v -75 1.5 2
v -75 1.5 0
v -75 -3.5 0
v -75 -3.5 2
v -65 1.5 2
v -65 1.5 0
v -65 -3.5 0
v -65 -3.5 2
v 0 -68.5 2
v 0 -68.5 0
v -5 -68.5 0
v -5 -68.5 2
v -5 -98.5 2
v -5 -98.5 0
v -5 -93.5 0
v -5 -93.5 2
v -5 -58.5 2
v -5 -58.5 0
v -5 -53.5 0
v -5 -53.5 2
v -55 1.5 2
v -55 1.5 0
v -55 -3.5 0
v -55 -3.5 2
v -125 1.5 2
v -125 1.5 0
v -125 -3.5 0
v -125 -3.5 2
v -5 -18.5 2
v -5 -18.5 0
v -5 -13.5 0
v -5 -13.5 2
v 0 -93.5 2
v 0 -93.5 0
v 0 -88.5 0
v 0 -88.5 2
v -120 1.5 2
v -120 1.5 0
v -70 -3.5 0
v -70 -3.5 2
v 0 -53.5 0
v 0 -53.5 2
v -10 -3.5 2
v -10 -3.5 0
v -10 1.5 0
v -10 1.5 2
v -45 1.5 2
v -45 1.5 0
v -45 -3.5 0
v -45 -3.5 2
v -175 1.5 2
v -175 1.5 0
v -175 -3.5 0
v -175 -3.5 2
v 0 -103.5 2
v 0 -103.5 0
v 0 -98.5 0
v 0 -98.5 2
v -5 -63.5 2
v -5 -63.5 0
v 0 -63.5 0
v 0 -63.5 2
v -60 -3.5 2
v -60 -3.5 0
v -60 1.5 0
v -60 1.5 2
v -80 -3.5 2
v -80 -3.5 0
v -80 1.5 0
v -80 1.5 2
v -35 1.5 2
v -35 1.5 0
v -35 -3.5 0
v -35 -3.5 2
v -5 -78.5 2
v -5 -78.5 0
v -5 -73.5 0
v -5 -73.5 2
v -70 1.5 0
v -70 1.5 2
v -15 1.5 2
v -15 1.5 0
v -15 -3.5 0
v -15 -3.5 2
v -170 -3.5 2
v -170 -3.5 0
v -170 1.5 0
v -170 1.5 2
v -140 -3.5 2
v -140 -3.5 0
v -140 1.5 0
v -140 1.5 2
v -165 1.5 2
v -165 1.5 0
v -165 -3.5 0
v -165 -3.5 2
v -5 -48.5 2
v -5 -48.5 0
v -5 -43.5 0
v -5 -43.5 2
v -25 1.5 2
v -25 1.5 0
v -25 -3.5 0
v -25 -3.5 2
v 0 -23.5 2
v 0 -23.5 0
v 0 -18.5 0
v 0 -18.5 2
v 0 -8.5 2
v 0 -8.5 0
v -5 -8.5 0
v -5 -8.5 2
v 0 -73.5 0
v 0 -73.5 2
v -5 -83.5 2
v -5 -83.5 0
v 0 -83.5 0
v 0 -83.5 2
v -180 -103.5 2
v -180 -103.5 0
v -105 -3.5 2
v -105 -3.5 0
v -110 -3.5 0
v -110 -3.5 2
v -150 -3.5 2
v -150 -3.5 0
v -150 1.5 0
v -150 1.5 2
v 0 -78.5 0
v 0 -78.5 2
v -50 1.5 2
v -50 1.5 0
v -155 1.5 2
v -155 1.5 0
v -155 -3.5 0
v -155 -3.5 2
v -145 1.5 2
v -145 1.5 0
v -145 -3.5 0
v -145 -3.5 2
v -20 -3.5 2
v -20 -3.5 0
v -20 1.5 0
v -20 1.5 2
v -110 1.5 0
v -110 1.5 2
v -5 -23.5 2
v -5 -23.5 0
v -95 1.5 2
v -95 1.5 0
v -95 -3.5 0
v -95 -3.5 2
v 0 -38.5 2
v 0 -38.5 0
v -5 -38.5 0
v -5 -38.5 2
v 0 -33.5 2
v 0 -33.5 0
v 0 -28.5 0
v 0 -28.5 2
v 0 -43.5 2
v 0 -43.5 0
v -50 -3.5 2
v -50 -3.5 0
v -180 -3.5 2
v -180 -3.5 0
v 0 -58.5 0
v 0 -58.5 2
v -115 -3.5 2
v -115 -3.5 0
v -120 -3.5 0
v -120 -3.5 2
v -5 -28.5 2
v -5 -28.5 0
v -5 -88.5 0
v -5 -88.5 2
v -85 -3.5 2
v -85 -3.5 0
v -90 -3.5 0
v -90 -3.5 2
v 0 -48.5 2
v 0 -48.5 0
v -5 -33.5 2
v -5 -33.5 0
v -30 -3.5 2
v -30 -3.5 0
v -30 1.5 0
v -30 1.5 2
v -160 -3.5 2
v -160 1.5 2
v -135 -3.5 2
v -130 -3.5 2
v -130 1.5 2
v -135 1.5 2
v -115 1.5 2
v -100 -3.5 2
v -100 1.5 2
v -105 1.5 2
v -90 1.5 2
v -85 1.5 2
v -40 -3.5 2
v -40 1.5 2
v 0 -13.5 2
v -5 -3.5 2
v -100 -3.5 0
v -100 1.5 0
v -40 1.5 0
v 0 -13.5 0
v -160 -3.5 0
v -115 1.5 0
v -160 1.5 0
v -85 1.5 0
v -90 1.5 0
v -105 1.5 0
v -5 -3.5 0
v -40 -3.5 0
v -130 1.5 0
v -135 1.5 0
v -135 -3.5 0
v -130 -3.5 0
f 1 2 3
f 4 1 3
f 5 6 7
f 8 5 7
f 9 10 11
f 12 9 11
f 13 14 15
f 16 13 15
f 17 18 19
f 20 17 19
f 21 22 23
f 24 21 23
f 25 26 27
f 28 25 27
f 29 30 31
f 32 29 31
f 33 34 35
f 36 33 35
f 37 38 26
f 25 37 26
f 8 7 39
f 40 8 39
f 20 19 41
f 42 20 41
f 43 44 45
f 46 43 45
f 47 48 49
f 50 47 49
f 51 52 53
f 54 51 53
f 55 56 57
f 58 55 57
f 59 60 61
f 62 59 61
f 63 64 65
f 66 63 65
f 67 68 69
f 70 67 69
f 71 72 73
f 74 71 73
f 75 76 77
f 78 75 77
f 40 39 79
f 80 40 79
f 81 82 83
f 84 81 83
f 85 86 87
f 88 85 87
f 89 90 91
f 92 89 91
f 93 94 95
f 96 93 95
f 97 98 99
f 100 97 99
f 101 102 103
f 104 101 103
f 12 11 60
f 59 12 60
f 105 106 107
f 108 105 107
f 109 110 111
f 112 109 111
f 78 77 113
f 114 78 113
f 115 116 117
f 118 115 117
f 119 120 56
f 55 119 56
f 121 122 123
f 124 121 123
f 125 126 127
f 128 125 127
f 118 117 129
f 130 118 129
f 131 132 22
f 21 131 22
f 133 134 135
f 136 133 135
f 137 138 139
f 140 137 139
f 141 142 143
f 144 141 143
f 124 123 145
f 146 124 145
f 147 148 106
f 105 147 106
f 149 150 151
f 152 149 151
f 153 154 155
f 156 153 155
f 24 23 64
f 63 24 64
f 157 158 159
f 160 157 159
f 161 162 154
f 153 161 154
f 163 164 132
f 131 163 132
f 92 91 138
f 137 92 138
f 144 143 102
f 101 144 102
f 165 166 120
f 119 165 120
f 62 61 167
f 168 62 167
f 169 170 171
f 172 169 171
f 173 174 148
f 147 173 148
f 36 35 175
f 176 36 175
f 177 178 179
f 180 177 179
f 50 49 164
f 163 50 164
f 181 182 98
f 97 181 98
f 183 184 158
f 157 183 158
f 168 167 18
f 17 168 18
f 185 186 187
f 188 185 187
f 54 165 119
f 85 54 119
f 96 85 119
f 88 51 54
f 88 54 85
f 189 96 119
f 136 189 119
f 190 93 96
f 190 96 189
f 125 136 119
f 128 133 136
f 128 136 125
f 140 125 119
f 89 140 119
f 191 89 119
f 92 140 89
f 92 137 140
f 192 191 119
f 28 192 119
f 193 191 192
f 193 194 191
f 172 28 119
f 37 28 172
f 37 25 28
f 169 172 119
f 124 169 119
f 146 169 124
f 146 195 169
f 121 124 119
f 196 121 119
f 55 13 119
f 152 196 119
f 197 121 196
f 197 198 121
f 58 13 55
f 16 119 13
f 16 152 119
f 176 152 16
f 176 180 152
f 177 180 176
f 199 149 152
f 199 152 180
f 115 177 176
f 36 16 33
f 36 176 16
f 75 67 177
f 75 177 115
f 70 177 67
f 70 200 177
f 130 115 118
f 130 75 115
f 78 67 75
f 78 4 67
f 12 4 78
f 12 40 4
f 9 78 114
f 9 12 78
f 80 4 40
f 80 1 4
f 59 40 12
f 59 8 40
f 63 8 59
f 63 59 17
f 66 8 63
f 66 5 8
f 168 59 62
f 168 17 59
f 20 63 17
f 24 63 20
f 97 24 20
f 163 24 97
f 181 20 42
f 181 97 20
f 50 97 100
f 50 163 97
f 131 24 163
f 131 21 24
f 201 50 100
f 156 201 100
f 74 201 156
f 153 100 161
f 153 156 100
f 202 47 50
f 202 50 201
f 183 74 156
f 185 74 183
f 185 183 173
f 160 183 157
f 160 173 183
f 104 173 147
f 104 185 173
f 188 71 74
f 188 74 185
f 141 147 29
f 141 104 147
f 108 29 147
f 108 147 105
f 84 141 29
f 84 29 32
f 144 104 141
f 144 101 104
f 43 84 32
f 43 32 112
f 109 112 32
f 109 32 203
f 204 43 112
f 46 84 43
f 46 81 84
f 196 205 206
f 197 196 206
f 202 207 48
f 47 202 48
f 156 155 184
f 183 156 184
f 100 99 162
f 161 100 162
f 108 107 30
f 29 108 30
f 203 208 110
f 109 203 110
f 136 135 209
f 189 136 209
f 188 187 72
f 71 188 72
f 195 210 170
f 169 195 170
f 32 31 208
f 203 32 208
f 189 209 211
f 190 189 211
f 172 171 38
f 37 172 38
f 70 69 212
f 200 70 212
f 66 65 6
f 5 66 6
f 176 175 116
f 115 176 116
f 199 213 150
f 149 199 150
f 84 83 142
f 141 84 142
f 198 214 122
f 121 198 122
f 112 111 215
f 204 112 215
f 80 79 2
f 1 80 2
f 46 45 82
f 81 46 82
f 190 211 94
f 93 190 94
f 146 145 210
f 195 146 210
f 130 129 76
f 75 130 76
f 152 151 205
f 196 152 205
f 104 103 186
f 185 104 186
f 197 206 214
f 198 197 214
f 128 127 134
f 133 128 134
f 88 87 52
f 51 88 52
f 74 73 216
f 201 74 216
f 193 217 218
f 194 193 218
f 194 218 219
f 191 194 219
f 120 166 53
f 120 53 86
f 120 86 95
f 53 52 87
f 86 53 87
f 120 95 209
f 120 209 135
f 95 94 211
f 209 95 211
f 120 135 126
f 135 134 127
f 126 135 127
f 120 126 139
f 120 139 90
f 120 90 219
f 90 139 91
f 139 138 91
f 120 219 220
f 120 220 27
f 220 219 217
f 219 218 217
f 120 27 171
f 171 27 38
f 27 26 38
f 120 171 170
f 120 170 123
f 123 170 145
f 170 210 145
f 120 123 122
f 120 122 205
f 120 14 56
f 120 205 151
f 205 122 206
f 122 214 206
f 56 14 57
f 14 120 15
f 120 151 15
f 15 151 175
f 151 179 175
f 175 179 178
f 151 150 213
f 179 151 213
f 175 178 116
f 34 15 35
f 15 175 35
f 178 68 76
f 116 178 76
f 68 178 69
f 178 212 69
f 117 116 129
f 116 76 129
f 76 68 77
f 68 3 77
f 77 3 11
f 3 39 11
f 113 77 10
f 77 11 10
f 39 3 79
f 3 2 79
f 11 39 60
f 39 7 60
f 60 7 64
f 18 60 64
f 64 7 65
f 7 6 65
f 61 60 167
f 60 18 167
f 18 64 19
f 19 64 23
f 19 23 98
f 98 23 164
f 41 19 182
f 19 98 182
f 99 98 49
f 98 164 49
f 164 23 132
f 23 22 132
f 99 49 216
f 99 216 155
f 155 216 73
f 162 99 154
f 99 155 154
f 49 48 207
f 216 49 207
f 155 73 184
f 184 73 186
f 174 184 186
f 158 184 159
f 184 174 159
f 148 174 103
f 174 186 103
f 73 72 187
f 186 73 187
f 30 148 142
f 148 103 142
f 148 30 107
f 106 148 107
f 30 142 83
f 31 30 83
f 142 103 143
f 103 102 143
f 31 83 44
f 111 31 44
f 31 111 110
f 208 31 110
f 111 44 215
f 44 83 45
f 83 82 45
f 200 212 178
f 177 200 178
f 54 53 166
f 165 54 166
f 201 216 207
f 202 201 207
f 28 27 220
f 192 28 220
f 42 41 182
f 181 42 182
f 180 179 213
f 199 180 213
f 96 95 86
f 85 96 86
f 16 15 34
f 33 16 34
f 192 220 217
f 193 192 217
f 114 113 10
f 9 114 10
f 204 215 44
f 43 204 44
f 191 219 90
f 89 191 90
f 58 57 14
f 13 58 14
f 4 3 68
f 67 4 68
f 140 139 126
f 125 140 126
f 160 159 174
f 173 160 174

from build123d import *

# Parameters (mm, degrees)
F1_DEPTH = 2


with BuildPart() as f1:
    # F0 (on Top) → F1 (new body)
    with BuildSketch(Plane.XY):
        Polygon((-180, -3.5), (-180, -103.5), (-5, -103.5), (0, -103.5), (0, -98.5), (-5, -98.5), (-5, -93.5), (0, -93.5), (0, -88.5), (-5, -88.5), (-5, -83.5), (0, -83.5), (0, -78.5), (-5, -78.5), (-5, -73.5), (0, -73.5), (0, -68.5), (-5, -68.5), (-5, -63.5), (0, -63.5), (0, -58.5), (-5, -58.5), (-5, -53.5), (0, -53.5), (0, -48.5), (-5, -48.5), (-5, -43.5), (0, -43.5), (0, -38.5), (-5, -38.5), (-5, -33.5), (0, -33.5), (0, -28.5), (-5, -28.5), (-5, -23.5), (0, -23.5), (0, -18.5), (-5, -18.5), (-5, -13.5), (0, -13.5), (0, -8.5), (-5, -8.5), (-5, -3.5), (-10, -3.5), (-10, 1.5), (-15, 1.5), (-15, -3.5), (-20, -3.5), (-20, 1.5), (-25, 1.5), (-25, -3.5), (-30, -3.5), (-30, 1.5), (-35, 1.5), (-35, -3.5), (-40, -3.5), (-40, 1.5), (-45, 1.5), (-45, -3.5), (-50, -3.5), (-50, 1.5), (-55, 1.5), (-55, -3.5), (-60, -3.5), (-60, 1.5), (-65, 1.5), (-65, -3.5), (-70, -3.5), (-70, 1.5), (-75, 1.5), (-75, -3.5), (-80, -3.5), (-80, 1.5), (-85, 1.5), (-85, -3.5), (-90, -3.5), (-90, 1.5), (-95, 1.5), (-95, -3.5), (-100, -3.5), (-100, 1.5), (-105, 1.5), (-105, -3.5), (-110, -3.5), (-110, 1.5), (-115, 1.5), (-115, -3.5), (-120, -3.5), (-120, 1.5), (-125, 1.5), (-125, -3.5), (-130, -3.5), (-130, 1.5), (-135, 1.5), (-135, -3.5), (-140, -3.5), (-140, 1.5), (-145, 1.5), (-145, -3.5), (-150, -3.5), (-150, 1.5), (-155, 1.5), (-155, -3.5), (-160, -3.5), (-160, 1.5), (-165, 1.5), (-165, -3.5), (-170, -3.5), (-170, 1.5), (-175, 1.5), (-175, -3.5), align=None)
    extrude(amount=F1_DEPTH)


solid = f1.part
